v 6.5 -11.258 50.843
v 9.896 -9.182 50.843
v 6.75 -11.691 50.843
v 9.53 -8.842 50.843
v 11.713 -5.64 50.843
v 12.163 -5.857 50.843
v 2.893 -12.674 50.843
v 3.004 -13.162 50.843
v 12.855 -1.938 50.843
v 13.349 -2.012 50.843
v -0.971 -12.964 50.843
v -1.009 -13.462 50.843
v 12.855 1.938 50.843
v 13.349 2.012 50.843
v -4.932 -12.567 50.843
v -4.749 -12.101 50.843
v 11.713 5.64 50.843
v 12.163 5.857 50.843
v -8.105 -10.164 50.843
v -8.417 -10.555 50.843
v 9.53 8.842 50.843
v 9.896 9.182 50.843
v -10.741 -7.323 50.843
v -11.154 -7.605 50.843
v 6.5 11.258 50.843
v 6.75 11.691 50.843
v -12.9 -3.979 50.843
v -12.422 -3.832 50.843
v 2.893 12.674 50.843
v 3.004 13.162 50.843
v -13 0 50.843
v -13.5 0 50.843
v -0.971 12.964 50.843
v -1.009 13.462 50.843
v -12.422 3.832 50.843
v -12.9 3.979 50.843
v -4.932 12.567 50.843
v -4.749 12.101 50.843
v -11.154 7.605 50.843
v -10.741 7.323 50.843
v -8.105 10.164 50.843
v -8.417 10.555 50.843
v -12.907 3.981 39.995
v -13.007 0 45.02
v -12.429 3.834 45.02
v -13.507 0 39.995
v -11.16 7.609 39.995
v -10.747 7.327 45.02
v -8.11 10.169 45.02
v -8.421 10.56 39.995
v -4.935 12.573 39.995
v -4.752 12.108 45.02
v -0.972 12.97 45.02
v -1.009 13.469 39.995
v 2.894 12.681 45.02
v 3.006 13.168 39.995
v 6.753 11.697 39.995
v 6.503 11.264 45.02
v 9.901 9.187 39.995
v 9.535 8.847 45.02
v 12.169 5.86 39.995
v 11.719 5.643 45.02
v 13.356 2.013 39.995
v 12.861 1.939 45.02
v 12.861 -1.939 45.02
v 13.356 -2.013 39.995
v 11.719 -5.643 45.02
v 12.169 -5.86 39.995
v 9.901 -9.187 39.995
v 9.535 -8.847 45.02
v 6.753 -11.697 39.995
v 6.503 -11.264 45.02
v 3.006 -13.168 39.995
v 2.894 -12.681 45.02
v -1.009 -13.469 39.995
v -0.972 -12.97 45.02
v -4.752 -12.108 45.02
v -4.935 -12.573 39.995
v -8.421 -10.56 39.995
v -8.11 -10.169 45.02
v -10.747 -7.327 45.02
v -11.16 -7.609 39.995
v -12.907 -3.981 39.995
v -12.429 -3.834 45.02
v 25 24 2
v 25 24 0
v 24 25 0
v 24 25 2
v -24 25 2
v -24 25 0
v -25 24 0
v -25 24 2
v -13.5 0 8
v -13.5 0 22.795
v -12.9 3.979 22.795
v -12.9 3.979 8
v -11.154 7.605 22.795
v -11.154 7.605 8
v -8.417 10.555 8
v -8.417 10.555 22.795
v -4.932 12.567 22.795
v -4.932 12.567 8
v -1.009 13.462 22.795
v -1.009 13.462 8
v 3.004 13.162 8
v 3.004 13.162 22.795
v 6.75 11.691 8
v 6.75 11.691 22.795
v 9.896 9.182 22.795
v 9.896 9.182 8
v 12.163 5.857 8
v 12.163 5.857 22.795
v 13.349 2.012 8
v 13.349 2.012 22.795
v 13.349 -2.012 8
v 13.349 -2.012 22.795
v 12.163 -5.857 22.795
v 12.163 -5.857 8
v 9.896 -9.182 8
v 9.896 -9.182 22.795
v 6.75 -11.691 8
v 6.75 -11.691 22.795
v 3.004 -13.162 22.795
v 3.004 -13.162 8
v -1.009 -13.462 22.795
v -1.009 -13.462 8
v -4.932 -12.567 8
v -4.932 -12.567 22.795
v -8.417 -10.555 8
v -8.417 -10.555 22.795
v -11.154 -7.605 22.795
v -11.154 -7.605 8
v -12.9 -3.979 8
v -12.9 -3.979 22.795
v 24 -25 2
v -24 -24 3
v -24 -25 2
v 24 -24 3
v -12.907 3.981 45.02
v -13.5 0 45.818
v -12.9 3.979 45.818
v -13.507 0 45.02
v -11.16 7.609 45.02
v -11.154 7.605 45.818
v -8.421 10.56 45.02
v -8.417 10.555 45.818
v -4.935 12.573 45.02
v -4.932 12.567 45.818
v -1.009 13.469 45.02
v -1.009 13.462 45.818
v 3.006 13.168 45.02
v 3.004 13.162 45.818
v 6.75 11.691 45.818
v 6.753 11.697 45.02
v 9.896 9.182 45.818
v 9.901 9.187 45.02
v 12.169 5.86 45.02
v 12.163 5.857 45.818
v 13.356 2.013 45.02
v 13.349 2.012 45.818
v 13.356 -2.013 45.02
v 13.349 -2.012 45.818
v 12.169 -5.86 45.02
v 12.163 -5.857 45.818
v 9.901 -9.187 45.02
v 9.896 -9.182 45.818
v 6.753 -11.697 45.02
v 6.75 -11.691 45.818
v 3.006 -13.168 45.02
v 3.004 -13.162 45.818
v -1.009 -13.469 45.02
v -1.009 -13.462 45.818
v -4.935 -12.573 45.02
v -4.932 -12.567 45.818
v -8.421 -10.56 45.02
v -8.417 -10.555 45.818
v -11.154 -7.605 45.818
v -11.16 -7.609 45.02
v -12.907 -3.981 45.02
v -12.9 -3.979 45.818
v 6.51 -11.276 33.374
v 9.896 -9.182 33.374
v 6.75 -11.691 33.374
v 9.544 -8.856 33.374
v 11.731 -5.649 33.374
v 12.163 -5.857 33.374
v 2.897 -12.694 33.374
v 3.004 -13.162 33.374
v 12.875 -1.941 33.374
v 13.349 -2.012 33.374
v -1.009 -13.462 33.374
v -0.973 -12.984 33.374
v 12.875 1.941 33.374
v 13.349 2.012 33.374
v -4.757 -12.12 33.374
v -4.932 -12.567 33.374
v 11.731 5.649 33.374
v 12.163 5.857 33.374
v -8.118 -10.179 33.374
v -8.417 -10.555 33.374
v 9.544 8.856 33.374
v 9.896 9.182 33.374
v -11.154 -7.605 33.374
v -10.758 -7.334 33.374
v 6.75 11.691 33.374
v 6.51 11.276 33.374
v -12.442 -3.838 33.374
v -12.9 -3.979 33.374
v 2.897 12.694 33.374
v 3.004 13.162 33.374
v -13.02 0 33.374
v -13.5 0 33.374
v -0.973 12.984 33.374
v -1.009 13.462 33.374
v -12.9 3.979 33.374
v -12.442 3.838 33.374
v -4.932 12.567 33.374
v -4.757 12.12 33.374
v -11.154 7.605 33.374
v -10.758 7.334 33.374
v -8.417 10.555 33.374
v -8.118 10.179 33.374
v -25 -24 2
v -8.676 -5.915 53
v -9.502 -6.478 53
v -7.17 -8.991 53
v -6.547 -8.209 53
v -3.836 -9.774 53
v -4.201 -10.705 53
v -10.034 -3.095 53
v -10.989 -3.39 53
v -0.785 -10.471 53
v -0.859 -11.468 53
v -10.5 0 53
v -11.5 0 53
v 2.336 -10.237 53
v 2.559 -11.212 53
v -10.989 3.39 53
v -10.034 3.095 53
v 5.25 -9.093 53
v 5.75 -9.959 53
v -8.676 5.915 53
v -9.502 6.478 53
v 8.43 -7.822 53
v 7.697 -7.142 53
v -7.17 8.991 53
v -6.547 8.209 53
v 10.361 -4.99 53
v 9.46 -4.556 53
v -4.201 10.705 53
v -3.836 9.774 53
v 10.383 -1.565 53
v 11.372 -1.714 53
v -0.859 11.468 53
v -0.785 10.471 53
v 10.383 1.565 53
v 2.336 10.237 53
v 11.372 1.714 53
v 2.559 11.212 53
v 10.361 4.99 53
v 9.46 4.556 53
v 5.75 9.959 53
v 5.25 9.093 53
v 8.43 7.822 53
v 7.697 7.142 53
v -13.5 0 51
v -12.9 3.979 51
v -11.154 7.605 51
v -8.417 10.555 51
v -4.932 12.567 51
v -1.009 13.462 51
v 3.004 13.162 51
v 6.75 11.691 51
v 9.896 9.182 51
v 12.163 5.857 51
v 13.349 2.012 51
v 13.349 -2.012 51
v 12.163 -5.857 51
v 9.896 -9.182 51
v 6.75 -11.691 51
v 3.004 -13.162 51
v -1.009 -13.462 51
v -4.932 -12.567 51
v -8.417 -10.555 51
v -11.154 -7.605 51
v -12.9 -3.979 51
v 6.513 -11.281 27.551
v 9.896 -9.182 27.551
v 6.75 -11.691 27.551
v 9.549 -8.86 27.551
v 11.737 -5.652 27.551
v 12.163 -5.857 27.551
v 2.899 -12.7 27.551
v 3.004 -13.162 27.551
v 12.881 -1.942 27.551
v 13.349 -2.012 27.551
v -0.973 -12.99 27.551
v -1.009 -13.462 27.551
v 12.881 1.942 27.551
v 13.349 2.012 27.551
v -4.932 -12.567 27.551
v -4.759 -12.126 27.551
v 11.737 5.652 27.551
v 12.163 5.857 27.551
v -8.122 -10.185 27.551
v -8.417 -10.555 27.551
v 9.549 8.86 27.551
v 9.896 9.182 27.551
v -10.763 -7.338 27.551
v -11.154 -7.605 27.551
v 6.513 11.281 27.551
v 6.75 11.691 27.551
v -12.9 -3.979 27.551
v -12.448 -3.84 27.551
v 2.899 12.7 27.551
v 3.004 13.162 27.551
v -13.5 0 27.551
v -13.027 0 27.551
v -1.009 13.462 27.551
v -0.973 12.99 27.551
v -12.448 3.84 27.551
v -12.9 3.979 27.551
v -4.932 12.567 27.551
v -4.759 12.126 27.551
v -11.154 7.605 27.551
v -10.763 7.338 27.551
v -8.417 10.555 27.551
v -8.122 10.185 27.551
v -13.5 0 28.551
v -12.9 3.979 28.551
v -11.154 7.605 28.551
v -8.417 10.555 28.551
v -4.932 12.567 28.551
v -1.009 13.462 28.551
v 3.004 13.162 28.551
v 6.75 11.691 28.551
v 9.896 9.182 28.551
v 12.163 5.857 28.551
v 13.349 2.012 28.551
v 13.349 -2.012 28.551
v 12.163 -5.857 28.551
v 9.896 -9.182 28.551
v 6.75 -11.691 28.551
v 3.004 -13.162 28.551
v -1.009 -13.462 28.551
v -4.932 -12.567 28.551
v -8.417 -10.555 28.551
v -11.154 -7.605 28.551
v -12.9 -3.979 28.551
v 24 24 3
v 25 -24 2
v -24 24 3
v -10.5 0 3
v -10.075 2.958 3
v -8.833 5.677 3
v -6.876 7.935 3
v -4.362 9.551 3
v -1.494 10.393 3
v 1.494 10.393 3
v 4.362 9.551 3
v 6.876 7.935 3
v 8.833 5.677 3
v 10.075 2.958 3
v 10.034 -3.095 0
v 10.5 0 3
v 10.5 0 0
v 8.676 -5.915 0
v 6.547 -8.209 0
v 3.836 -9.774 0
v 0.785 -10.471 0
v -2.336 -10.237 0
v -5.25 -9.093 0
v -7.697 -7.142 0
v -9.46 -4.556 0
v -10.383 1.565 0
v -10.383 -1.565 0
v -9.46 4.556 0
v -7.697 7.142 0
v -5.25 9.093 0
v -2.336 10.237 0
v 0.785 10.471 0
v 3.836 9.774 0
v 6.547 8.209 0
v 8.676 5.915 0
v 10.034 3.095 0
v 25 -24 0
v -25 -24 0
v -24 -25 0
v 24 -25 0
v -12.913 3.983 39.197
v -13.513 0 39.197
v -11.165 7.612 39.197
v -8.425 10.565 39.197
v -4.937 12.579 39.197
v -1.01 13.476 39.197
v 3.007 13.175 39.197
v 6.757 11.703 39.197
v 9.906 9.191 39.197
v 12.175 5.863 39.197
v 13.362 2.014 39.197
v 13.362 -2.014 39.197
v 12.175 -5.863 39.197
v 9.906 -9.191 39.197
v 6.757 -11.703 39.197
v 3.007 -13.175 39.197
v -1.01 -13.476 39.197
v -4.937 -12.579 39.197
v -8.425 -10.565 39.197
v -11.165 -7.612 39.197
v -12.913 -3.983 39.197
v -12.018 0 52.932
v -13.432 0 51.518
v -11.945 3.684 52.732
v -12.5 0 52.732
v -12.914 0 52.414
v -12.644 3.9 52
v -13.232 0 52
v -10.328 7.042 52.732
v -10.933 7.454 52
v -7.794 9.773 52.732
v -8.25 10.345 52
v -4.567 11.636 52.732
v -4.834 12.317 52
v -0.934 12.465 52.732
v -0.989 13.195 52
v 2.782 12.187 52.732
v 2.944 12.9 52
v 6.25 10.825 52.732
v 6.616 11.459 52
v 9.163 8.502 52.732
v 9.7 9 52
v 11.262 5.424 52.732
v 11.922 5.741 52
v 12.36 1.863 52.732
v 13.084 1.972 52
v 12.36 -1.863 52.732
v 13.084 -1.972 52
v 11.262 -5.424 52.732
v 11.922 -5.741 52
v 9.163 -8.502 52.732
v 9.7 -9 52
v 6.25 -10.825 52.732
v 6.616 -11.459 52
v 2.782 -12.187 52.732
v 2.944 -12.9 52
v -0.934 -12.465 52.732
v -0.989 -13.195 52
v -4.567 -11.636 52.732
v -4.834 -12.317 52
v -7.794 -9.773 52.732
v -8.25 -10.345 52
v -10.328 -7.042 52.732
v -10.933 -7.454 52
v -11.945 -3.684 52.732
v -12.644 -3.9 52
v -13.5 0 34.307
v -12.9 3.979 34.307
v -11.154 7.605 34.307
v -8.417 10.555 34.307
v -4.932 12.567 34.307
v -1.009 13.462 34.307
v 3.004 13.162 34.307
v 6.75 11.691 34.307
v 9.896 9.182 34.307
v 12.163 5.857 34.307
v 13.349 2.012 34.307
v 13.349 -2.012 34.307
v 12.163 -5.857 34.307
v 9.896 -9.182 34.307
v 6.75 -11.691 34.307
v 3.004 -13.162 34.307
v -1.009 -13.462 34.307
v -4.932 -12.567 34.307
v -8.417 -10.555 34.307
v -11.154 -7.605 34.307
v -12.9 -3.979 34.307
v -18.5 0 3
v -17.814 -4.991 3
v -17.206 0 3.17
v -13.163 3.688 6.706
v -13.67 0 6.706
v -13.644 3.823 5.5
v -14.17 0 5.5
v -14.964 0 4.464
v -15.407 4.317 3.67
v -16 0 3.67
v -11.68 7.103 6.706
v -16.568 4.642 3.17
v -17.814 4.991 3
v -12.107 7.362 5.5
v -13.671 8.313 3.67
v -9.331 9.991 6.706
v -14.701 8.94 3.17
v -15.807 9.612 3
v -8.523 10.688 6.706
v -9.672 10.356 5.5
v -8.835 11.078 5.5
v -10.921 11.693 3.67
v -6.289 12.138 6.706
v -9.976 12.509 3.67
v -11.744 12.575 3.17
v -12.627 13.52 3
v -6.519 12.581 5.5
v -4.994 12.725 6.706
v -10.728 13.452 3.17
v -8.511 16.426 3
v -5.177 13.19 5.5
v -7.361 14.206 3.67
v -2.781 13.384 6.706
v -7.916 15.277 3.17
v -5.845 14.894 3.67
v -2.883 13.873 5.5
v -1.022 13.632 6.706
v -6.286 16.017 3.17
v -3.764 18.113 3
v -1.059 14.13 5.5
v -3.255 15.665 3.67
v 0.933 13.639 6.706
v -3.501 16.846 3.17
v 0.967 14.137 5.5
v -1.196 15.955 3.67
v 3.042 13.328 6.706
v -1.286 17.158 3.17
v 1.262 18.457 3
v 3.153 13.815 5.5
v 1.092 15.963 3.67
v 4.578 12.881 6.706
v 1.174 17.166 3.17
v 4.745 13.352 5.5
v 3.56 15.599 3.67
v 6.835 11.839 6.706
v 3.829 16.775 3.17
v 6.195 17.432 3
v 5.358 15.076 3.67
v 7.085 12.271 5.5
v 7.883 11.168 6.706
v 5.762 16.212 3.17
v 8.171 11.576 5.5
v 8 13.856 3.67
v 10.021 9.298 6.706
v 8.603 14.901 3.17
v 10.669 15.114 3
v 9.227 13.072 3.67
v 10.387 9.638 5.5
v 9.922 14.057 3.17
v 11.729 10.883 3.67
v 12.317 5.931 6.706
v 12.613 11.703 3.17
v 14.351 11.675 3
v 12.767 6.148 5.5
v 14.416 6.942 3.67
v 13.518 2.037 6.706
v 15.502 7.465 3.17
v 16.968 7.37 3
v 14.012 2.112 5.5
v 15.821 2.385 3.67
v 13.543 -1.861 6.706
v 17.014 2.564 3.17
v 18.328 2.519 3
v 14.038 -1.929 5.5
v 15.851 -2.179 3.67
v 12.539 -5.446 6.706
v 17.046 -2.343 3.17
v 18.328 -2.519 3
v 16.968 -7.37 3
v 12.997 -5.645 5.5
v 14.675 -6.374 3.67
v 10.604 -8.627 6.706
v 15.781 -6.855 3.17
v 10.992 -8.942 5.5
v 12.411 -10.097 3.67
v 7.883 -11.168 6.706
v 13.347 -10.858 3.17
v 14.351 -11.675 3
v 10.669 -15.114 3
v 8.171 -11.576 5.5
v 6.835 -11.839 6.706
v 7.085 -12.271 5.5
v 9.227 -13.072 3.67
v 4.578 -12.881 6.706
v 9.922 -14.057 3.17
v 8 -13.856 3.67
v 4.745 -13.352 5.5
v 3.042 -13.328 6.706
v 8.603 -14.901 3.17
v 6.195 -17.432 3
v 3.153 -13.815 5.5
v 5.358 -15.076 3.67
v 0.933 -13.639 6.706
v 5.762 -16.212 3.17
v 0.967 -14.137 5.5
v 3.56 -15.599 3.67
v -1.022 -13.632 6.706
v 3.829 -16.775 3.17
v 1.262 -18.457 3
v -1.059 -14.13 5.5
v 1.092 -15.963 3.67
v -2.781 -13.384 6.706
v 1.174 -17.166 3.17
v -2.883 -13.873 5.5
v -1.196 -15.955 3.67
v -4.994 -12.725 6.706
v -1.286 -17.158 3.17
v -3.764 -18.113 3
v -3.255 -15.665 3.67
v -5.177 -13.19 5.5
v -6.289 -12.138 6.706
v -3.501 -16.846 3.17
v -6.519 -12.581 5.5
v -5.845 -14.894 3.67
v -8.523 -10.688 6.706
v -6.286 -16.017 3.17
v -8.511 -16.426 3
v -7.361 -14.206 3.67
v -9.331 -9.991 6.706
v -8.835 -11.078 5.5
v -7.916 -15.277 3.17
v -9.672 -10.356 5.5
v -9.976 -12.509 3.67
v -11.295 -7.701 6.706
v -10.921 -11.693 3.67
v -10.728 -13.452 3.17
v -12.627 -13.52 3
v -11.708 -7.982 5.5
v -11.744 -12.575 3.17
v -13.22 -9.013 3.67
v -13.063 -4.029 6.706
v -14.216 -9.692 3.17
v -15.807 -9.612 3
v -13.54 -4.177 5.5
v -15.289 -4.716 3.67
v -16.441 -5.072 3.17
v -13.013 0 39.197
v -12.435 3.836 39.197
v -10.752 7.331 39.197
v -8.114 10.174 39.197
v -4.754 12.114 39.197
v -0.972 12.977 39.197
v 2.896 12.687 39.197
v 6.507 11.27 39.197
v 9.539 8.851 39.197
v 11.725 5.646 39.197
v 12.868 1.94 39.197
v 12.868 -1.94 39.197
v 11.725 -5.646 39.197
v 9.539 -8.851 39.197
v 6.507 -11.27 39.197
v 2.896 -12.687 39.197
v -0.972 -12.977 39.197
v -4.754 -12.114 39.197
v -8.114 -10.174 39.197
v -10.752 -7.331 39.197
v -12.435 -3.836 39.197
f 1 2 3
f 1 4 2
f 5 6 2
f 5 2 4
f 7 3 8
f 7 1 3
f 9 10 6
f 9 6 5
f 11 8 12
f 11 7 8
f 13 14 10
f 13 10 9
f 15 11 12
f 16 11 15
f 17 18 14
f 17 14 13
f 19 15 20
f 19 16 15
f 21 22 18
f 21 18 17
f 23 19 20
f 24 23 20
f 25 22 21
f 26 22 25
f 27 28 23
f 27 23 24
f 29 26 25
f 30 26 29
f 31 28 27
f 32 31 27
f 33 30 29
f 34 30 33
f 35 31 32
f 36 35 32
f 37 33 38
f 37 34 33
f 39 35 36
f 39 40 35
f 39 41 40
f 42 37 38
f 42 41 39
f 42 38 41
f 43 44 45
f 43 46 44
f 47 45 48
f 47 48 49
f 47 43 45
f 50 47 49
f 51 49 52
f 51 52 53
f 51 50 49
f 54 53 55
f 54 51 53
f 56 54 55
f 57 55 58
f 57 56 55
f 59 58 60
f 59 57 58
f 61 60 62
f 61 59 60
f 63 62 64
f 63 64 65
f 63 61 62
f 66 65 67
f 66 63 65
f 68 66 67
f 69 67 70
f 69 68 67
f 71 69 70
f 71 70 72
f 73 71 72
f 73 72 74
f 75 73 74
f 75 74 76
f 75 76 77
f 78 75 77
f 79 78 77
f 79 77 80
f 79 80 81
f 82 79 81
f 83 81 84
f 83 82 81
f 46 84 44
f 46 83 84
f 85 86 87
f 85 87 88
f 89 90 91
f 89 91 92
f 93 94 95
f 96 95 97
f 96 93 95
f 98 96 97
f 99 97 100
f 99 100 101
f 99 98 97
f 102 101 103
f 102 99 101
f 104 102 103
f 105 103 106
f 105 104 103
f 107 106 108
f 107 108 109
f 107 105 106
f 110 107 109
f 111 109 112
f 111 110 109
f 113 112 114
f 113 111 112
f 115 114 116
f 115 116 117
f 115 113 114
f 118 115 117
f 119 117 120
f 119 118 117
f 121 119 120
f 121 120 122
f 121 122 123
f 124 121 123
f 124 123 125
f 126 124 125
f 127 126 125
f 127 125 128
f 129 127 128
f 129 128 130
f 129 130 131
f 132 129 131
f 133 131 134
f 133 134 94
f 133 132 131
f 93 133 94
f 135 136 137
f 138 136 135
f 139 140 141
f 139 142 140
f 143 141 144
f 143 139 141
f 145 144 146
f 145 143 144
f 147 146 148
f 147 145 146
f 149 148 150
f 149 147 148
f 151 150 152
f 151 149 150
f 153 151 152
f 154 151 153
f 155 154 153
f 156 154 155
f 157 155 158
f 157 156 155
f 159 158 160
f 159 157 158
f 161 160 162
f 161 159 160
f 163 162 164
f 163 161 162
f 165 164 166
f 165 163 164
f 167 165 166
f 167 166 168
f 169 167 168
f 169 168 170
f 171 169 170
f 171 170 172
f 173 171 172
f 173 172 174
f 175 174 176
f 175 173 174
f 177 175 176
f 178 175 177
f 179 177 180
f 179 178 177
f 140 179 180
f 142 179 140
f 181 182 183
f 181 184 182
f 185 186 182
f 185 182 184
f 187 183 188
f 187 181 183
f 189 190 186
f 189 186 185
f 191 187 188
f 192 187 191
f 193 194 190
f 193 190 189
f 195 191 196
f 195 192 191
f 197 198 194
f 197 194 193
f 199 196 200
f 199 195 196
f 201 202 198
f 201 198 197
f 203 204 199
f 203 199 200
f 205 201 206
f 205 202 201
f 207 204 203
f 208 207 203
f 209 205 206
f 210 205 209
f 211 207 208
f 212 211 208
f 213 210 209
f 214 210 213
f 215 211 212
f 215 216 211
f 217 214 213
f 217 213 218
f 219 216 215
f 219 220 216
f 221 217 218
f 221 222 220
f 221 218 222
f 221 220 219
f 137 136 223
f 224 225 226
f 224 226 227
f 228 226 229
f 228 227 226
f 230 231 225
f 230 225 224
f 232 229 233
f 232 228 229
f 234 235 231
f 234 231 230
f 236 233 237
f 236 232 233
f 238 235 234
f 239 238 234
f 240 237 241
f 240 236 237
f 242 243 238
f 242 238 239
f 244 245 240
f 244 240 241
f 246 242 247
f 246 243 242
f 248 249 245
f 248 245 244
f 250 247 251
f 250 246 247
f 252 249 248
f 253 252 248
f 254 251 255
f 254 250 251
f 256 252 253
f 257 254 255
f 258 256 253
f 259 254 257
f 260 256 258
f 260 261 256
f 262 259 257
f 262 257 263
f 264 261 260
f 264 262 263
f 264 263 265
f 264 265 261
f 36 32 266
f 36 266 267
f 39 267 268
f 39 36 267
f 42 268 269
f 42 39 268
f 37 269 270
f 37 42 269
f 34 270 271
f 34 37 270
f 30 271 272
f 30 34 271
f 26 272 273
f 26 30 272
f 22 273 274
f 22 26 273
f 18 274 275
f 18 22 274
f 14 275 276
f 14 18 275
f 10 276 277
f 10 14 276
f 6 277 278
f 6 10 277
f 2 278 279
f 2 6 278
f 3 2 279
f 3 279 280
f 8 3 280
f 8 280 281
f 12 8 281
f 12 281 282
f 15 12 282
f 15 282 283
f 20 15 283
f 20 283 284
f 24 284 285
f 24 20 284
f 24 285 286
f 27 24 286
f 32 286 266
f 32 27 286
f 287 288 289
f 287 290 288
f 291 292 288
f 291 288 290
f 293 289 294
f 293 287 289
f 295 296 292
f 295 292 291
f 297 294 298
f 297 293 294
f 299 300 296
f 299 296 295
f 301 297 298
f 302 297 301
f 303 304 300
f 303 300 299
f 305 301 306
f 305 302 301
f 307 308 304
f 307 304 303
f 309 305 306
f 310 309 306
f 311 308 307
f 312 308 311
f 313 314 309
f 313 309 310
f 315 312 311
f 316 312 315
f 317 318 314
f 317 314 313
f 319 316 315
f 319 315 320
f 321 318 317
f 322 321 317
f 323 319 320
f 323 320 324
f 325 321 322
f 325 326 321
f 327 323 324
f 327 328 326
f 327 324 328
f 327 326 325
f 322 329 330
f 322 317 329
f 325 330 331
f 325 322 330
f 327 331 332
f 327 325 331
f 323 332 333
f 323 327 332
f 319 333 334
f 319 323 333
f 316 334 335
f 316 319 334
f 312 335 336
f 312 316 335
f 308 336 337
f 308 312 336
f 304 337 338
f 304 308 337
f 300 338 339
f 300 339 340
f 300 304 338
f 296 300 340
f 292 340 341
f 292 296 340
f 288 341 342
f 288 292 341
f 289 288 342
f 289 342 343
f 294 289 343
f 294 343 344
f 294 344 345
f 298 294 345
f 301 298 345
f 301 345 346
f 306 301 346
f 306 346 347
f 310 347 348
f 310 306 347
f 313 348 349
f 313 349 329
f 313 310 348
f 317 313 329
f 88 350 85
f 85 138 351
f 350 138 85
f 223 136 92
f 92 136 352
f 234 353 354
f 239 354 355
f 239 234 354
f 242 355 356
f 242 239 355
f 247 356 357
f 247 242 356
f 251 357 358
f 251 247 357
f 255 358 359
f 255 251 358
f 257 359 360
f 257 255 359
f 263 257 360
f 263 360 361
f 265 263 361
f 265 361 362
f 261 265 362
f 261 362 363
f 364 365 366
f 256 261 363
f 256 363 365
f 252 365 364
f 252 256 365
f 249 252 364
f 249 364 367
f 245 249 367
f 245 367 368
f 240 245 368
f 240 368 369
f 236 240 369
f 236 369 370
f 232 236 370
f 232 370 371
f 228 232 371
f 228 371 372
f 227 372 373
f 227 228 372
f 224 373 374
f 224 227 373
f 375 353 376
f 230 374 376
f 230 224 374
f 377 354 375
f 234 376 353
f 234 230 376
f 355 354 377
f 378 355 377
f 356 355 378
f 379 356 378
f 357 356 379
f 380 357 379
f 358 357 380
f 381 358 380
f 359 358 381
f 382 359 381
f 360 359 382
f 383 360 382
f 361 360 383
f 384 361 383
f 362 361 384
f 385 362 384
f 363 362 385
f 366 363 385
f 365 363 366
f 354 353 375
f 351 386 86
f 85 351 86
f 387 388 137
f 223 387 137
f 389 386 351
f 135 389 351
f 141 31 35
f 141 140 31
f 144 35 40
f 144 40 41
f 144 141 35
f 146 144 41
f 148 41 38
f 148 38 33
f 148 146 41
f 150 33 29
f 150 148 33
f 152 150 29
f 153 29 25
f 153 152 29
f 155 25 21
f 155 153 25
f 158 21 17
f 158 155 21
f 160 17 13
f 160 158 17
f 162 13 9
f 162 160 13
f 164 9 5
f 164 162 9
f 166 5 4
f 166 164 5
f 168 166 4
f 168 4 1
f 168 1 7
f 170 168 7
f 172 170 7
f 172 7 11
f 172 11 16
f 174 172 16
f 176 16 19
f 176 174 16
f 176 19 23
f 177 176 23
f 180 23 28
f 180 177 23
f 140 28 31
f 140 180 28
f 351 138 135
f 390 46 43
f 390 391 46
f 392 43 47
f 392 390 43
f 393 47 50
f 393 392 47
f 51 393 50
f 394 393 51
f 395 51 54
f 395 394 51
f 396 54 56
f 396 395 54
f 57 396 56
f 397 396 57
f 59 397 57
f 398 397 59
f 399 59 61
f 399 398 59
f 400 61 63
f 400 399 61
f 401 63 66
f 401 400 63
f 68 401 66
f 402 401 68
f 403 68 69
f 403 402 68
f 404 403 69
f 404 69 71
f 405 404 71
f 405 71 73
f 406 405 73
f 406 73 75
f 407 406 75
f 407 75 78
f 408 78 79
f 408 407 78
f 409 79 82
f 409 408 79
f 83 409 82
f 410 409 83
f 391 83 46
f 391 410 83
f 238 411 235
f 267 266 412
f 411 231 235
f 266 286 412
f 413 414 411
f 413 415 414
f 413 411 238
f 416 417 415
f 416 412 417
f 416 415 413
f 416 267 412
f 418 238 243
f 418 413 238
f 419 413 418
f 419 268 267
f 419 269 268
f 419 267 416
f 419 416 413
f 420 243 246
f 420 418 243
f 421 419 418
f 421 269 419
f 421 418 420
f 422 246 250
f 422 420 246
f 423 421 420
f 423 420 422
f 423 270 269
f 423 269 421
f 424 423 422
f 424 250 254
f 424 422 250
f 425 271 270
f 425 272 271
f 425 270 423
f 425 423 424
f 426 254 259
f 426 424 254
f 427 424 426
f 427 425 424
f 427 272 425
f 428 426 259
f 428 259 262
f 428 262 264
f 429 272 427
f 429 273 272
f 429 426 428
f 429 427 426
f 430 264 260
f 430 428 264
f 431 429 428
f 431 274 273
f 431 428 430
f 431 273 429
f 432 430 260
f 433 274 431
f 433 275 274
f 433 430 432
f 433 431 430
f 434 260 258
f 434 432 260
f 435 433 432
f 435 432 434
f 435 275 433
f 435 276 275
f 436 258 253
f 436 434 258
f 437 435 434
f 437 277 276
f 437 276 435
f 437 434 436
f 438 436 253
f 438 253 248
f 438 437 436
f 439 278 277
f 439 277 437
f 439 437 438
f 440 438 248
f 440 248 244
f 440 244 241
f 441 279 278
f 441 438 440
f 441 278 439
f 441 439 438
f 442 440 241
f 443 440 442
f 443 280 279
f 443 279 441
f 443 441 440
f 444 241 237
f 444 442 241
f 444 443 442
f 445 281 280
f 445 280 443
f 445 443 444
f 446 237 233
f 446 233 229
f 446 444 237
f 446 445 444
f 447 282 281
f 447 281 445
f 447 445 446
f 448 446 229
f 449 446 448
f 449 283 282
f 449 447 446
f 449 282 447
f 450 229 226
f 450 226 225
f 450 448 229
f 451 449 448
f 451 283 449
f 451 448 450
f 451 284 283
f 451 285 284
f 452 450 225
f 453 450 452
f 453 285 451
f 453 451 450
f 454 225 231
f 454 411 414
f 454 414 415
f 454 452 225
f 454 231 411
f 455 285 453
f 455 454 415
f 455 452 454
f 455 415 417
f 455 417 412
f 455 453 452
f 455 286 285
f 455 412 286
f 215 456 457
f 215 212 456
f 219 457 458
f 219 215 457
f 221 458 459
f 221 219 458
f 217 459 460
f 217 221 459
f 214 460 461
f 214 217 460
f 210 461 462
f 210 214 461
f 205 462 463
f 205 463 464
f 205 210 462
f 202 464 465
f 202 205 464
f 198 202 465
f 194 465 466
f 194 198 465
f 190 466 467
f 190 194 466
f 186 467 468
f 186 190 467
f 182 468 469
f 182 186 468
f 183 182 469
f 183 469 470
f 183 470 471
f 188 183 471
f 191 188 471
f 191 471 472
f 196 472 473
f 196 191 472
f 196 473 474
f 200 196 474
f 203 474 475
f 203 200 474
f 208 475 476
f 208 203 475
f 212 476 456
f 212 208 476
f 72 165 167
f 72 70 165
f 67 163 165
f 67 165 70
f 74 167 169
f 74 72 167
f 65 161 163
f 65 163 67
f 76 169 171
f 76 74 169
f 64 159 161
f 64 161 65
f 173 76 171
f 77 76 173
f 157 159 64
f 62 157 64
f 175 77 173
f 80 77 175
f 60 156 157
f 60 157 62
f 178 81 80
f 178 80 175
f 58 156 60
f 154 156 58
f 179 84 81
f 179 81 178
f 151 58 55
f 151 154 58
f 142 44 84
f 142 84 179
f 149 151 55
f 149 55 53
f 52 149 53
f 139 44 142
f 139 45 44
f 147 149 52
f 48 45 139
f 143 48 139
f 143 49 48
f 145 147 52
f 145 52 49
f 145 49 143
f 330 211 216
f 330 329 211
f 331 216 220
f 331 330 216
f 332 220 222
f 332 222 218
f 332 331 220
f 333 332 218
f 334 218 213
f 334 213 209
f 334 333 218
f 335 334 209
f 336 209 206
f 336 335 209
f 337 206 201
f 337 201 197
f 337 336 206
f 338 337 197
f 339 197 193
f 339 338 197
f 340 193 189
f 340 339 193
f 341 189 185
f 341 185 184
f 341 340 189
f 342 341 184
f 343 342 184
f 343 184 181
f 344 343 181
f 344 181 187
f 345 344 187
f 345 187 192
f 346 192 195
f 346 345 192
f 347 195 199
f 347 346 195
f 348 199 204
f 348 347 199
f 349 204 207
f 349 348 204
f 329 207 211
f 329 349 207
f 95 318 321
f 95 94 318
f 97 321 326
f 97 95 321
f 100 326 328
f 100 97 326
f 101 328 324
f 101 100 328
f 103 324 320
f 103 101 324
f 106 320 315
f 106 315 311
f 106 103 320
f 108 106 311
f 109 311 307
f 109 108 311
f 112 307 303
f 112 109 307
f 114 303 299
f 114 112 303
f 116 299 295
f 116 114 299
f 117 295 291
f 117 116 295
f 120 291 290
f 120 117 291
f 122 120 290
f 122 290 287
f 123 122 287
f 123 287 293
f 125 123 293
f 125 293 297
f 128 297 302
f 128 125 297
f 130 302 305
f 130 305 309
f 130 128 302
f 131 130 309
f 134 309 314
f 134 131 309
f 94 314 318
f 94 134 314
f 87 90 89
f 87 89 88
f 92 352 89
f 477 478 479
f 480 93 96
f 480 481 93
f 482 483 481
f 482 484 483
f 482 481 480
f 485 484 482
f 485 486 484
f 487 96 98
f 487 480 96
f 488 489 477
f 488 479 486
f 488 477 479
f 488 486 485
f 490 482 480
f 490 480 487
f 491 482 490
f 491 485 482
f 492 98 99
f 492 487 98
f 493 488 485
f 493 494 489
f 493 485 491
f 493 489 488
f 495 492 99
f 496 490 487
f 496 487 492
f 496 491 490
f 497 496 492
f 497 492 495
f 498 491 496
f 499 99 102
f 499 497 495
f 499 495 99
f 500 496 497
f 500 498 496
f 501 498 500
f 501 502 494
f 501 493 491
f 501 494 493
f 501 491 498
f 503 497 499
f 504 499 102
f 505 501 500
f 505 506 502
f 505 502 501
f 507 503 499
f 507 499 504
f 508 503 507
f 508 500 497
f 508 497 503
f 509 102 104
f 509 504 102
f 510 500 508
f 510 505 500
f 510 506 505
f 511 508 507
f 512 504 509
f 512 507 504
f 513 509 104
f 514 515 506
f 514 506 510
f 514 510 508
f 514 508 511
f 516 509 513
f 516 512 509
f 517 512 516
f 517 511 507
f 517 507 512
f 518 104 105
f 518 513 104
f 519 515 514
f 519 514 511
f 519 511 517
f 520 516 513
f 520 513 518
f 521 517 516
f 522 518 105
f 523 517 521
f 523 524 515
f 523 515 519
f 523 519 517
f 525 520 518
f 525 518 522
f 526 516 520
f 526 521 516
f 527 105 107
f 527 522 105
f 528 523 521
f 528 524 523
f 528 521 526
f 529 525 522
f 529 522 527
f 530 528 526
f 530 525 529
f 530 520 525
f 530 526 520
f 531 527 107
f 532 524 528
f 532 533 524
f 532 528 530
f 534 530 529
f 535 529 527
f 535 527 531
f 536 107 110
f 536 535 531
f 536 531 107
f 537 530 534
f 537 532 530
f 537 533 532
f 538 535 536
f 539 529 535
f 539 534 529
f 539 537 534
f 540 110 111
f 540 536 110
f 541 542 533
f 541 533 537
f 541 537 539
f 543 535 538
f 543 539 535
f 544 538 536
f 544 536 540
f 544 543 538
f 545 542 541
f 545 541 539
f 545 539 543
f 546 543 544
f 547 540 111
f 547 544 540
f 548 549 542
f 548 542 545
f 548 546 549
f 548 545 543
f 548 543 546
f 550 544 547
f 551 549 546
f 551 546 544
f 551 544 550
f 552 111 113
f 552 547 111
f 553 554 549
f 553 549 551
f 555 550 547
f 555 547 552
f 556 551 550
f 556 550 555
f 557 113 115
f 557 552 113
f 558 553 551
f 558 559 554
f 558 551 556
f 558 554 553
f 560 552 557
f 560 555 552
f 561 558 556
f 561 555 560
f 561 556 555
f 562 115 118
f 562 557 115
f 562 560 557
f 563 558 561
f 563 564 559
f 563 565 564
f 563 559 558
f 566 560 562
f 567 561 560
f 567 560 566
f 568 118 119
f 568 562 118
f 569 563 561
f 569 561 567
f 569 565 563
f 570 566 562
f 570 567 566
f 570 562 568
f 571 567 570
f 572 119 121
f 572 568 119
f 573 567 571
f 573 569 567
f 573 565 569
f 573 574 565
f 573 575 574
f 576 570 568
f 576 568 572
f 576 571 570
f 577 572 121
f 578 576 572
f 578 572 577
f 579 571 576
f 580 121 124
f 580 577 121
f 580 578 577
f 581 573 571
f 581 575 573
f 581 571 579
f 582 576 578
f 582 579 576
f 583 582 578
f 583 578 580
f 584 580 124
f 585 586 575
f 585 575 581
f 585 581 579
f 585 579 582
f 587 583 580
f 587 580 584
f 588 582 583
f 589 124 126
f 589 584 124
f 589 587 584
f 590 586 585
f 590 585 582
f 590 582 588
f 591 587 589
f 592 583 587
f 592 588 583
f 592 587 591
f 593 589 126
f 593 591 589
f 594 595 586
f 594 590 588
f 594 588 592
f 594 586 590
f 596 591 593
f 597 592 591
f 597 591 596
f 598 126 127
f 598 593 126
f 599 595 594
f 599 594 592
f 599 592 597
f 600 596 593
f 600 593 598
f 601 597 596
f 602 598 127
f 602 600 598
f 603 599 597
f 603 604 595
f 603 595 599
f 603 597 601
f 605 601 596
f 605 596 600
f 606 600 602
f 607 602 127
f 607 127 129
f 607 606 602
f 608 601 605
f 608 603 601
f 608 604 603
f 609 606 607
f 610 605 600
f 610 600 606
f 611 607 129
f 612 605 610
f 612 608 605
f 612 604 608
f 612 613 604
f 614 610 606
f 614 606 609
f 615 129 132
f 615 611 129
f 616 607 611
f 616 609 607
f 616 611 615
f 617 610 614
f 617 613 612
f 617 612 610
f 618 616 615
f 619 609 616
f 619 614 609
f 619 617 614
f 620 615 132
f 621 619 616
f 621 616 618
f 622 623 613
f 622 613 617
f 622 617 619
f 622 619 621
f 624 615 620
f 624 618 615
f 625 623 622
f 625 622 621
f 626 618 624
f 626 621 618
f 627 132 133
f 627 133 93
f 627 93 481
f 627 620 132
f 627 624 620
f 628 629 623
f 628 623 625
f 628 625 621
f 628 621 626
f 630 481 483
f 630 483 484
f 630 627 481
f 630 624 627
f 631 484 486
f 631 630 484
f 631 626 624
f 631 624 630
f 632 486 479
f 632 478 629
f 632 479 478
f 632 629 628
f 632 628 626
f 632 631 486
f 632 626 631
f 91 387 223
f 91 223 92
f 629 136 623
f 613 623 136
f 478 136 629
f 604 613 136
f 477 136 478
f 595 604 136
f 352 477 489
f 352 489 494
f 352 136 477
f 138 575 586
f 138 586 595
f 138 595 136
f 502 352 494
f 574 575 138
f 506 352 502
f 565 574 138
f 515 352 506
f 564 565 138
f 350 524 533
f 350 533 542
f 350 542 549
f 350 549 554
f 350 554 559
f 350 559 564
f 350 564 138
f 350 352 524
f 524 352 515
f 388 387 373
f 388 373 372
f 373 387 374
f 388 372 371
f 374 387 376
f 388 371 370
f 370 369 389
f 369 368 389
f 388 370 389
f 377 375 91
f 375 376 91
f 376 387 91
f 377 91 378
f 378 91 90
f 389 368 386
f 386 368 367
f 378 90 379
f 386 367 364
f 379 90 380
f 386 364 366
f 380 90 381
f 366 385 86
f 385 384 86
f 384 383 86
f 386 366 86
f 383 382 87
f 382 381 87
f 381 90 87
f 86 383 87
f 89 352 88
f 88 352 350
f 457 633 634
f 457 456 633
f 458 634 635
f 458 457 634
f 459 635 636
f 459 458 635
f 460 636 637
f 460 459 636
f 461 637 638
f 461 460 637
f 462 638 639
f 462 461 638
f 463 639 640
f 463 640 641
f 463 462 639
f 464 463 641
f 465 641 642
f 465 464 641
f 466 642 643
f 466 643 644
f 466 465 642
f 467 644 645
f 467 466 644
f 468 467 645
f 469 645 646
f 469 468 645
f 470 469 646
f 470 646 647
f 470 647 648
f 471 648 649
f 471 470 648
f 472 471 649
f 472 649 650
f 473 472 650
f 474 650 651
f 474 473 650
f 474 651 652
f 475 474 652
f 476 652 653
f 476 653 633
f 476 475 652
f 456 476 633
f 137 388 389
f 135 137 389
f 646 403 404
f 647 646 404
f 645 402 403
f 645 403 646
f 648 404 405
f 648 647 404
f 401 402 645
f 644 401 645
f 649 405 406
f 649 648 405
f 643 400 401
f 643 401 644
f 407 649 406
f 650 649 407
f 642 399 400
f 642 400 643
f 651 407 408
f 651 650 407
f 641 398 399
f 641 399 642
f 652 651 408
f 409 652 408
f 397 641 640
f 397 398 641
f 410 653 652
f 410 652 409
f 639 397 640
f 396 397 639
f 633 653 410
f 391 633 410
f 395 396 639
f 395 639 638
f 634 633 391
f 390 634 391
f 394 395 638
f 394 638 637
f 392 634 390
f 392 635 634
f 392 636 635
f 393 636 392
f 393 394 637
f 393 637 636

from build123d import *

# Parameters (mm, degrees)
F0_W     = 50
F0_H     = 50
F0_R     = 10.5
F1_DEPTH = 3
F4_R     = 2
F5_SIZE  = 1


with BuildPart() as f1:
    # F0 (on Top) → F1 (new body)
    with BuildSketch(Plane.XY):
        Rectangle(F0_W, F0_H)
        Circle(F0_R, mode=Mode.SUBTRACT)
    extrude(amount=F1_DEPTH)

    # F2 (on Front) → F3 (revolve)
    with BuildSketch(Plane.XZ):
        with BuildLine():
            Line((-10.5, 3), (-10.5, 53))
            Line((-10.5, 53), (-13.5, 53))
            Line((-13.5, 53), (-13.5, 50.842942))
            Line((-13.5, 50.842942), (-13, 50.842942))
            Line((-13, 50.842942), (-13.5, 45.818362))
            Line((-13.5, 45.818362), (-13.506682, 45.019927))
            Line((-13.506682, 45.019927), (-13.006682, 45.019927))
            Line((-13.006682, 45.019927), (-13.506682, 39.995346))
            Line((-13.506682, 39.995346), (-13.513363, 39.196911))
            Line((-13.513363, 39.196911), (-13.013363, 39.196911))
            Line((-13.013363, 39.196911), (-13.5, 34.306619))
            Line((-13.5, 34.306619), (-13.5, 33.373896))
            Line((-13.5, 33.373896), (-13.020045, 33.373896))
            Line((-13.020045, 33.373896), (-13.5, 28.550748))
            Line((-13.5, 28.550748), (-13.5, 27.550881))
            Line((-13.5, 27.550881), (-13.026726, 27.550881))
            Line((-13.026726, 27.550881), (-13.5, 22.794877))
            Line((-13.5, 22.794877), (-13.5, 8))
            ThreePointArc((-13.5, 8), (-14.964466, 4.464466), (-18.5, 3))
            Line((-18.5, 3), (-10.5, 3))
        make_face()
    revolve(axis=Axis((0, 0, 16.531735), (0, 0, -1)))

    # F4
    f4_edges = [f1.edges().sort_by_distance(p)[0] for p in [
        (13.5, 0, 53),
    ]]
    fillet(f4_edges, radius=F4_R)

    # F5
    f5_edges = [f1.edges().sort_by_distance(p)[0] for p in [
        (-25, 0, 3),
        (0, -25, 3),
        (25, 0, 3),
        (0, 25, 3),
        (-25, -25, 1.5),
        (25, -25, 1.5),
        (25, 25, 1.5),
        (-25, 25, 1.5),
    ]]
    chamfer(f5_edges, length=F5_SIZE)


solid = f1.part
